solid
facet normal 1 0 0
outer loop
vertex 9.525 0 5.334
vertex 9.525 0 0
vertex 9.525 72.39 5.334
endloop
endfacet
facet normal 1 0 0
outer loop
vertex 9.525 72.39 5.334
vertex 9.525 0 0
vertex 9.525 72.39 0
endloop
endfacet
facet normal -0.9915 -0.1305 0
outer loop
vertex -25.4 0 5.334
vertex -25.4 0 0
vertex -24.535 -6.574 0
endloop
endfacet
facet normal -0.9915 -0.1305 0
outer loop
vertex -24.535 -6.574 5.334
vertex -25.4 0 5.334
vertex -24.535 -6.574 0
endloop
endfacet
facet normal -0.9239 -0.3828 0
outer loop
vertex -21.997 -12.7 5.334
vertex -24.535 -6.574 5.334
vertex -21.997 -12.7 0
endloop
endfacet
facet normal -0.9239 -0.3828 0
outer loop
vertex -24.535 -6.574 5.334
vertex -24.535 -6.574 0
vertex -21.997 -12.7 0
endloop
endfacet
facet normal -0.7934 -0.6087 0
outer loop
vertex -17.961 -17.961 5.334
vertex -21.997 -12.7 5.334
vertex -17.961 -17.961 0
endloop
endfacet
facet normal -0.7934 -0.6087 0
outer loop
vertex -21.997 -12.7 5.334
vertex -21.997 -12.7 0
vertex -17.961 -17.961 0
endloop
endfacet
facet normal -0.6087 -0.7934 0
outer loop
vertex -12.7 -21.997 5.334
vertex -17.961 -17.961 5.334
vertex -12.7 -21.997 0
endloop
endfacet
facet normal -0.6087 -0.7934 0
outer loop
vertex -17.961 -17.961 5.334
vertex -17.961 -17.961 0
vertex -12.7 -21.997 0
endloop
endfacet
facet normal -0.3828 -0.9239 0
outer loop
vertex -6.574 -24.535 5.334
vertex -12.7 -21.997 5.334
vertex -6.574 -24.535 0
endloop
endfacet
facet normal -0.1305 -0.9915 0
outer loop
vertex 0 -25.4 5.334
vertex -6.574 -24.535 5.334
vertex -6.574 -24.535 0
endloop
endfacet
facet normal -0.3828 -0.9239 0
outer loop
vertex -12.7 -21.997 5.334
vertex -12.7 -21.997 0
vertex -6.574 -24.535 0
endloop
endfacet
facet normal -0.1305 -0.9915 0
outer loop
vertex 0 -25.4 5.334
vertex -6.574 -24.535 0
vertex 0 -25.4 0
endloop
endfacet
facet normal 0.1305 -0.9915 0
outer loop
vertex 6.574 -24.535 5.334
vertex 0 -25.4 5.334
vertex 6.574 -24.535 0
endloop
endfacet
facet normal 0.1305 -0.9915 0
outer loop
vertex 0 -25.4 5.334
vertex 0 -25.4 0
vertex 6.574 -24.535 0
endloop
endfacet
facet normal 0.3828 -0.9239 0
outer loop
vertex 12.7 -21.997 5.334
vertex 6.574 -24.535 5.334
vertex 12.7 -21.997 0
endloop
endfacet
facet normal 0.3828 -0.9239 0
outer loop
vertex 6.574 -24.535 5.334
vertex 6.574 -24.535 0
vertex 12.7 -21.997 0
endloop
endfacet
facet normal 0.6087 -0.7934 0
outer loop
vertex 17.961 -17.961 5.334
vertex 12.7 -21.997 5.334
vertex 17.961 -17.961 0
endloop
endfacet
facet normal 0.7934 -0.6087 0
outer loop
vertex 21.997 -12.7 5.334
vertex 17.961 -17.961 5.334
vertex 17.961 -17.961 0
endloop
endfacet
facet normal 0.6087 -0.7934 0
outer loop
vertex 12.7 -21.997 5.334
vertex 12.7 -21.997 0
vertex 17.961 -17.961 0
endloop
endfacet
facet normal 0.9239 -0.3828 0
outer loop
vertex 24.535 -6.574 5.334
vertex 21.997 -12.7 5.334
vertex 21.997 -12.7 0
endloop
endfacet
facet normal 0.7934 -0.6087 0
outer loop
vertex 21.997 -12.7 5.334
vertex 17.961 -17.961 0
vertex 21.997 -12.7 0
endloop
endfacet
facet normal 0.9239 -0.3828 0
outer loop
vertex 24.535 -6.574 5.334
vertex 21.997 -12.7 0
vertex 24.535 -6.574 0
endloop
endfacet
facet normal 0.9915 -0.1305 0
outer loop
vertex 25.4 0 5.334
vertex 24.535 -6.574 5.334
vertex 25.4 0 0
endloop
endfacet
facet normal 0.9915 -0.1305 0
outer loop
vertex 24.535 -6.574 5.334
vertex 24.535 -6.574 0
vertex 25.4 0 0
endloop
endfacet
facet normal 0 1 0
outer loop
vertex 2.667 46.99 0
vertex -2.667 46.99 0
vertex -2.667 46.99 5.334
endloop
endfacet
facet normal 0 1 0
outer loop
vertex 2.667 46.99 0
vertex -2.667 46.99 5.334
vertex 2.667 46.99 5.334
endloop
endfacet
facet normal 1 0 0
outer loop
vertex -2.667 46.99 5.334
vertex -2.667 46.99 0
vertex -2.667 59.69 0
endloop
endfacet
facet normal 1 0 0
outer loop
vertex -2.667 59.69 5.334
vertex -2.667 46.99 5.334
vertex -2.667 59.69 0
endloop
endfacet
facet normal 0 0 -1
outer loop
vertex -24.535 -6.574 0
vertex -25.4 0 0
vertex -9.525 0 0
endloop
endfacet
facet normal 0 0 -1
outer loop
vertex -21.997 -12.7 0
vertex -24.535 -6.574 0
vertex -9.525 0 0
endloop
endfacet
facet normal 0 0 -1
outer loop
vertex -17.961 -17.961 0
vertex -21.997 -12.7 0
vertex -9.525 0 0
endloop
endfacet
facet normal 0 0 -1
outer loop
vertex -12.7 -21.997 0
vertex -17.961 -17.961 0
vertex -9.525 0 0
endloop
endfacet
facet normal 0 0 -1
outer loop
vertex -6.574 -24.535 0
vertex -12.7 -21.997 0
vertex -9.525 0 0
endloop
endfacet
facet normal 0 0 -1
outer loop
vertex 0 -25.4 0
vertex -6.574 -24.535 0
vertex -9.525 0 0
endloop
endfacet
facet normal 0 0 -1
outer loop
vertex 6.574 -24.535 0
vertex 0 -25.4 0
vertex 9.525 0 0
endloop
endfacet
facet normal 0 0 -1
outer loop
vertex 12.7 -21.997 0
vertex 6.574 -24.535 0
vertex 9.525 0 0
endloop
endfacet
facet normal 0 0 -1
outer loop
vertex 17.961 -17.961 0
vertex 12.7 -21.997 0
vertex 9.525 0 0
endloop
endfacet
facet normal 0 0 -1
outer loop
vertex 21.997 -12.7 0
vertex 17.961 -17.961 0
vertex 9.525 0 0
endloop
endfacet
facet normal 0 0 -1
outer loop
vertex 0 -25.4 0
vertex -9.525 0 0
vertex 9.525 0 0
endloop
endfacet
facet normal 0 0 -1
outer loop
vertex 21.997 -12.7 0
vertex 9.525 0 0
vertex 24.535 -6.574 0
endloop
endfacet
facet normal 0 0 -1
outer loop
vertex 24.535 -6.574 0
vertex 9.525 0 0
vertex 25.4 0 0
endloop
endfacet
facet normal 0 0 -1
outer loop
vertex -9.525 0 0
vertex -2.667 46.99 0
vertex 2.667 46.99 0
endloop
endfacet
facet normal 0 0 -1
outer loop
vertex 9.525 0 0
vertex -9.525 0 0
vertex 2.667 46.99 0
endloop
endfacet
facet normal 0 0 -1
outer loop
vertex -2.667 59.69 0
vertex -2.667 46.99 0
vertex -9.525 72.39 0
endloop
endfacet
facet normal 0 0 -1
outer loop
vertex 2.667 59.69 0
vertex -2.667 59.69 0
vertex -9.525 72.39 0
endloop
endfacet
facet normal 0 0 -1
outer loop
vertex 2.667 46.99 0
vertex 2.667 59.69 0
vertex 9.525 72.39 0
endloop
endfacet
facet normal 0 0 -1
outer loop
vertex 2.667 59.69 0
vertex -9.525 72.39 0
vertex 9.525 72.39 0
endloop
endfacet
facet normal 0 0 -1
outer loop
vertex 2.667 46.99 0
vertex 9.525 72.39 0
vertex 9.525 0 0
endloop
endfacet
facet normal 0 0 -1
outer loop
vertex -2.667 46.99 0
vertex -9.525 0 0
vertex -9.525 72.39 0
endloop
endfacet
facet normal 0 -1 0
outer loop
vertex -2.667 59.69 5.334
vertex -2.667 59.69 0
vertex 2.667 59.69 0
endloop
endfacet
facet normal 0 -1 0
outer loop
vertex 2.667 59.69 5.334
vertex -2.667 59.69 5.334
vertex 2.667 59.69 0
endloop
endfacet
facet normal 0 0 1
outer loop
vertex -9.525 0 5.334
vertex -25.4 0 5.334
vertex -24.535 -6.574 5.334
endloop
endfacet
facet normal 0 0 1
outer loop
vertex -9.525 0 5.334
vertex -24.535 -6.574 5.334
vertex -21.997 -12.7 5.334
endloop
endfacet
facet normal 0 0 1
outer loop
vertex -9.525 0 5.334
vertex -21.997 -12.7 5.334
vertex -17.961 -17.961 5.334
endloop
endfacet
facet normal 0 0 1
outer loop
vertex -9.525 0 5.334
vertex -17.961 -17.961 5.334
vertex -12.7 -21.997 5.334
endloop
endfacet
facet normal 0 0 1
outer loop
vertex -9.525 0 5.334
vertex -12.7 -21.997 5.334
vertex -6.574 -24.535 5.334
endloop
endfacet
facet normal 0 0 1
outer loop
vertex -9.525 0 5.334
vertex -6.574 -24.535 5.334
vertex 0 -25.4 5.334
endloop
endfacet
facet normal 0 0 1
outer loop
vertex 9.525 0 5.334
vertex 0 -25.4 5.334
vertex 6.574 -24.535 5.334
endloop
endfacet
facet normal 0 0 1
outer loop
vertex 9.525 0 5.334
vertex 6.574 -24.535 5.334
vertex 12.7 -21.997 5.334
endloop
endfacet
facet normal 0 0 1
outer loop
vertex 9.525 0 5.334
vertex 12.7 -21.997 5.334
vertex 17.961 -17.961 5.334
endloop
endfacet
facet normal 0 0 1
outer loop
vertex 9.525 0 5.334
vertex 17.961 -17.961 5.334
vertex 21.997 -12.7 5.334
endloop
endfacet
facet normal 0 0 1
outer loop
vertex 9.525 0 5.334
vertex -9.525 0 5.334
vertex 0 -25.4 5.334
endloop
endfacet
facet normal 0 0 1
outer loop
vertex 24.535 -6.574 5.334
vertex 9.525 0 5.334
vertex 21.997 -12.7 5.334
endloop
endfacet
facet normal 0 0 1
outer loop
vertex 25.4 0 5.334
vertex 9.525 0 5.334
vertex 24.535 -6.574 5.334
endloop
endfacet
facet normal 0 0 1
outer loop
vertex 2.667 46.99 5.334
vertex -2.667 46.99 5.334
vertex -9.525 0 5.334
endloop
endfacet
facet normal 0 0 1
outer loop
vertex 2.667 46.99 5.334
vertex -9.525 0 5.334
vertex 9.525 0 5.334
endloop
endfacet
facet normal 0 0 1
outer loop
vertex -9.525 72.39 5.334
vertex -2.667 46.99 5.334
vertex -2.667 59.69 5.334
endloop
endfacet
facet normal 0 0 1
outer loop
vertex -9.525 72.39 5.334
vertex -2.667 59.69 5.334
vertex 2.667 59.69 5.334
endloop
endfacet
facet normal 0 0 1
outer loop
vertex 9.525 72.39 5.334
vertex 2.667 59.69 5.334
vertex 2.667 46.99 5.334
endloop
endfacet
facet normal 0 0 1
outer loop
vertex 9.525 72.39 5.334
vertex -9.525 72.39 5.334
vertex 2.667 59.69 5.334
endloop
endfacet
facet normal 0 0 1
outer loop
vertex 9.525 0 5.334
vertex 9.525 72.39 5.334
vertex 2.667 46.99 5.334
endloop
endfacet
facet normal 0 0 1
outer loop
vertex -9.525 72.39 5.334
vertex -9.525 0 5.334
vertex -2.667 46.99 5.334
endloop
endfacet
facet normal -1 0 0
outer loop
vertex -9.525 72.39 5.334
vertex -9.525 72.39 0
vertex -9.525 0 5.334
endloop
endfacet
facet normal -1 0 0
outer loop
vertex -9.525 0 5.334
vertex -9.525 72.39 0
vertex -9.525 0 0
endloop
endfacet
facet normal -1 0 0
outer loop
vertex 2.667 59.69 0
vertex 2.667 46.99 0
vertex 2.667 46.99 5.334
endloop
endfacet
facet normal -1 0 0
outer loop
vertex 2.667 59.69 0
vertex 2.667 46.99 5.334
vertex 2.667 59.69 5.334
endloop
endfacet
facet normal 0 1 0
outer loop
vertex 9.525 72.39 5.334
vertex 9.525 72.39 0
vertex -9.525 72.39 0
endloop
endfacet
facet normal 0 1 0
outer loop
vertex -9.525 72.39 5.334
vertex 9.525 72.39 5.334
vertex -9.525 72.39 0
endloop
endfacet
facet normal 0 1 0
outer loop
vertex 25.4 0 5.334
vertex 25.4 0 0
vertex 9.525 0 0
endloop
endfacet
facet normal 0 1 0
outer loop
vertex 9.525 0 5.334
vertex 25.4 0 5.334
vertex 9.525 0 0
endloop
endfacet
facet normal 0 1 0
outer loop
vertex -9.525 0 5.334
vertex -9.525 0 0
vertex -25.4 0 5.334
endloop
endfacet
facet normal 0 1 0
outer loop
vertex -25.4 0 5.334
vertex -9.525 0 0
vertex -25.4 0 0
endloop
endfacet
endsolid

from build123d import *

# Parameters (mm, degrees)
SKETCH1_W           = 5.334
SKETCH1_H           = 12.7
BOSS_EXTRUDE1_DEPTH = 5.334


with BuildPart() as part:
    # Sketch1 → Boss-Extrude1 (new body)
    with BuildSketch(Plane.XY):
        with BuildLine():
            Line((-9.525, 0), (-25.4, 0))
            ThreePointArc((-25.4, 0), (0, -25.4), (25.4, 0))
            Line((25.4, 0), (9.525, 0))
            Line((9.525, 0), (9.525, 72.39))
            Line((9.525, 72.39), (-9.525, 72.39))
            Line((-9.525, 72.39), (-9.525, 0))
        make_face()
        with Locations((0, 53.34)):
            Rectangle(SKETCH1_W, SKETCH1_H, mode=Mode.SUBTRACT)
    extrude(amount=BOSS_EXTRUDE1_DEPTH)


solid = part.part
